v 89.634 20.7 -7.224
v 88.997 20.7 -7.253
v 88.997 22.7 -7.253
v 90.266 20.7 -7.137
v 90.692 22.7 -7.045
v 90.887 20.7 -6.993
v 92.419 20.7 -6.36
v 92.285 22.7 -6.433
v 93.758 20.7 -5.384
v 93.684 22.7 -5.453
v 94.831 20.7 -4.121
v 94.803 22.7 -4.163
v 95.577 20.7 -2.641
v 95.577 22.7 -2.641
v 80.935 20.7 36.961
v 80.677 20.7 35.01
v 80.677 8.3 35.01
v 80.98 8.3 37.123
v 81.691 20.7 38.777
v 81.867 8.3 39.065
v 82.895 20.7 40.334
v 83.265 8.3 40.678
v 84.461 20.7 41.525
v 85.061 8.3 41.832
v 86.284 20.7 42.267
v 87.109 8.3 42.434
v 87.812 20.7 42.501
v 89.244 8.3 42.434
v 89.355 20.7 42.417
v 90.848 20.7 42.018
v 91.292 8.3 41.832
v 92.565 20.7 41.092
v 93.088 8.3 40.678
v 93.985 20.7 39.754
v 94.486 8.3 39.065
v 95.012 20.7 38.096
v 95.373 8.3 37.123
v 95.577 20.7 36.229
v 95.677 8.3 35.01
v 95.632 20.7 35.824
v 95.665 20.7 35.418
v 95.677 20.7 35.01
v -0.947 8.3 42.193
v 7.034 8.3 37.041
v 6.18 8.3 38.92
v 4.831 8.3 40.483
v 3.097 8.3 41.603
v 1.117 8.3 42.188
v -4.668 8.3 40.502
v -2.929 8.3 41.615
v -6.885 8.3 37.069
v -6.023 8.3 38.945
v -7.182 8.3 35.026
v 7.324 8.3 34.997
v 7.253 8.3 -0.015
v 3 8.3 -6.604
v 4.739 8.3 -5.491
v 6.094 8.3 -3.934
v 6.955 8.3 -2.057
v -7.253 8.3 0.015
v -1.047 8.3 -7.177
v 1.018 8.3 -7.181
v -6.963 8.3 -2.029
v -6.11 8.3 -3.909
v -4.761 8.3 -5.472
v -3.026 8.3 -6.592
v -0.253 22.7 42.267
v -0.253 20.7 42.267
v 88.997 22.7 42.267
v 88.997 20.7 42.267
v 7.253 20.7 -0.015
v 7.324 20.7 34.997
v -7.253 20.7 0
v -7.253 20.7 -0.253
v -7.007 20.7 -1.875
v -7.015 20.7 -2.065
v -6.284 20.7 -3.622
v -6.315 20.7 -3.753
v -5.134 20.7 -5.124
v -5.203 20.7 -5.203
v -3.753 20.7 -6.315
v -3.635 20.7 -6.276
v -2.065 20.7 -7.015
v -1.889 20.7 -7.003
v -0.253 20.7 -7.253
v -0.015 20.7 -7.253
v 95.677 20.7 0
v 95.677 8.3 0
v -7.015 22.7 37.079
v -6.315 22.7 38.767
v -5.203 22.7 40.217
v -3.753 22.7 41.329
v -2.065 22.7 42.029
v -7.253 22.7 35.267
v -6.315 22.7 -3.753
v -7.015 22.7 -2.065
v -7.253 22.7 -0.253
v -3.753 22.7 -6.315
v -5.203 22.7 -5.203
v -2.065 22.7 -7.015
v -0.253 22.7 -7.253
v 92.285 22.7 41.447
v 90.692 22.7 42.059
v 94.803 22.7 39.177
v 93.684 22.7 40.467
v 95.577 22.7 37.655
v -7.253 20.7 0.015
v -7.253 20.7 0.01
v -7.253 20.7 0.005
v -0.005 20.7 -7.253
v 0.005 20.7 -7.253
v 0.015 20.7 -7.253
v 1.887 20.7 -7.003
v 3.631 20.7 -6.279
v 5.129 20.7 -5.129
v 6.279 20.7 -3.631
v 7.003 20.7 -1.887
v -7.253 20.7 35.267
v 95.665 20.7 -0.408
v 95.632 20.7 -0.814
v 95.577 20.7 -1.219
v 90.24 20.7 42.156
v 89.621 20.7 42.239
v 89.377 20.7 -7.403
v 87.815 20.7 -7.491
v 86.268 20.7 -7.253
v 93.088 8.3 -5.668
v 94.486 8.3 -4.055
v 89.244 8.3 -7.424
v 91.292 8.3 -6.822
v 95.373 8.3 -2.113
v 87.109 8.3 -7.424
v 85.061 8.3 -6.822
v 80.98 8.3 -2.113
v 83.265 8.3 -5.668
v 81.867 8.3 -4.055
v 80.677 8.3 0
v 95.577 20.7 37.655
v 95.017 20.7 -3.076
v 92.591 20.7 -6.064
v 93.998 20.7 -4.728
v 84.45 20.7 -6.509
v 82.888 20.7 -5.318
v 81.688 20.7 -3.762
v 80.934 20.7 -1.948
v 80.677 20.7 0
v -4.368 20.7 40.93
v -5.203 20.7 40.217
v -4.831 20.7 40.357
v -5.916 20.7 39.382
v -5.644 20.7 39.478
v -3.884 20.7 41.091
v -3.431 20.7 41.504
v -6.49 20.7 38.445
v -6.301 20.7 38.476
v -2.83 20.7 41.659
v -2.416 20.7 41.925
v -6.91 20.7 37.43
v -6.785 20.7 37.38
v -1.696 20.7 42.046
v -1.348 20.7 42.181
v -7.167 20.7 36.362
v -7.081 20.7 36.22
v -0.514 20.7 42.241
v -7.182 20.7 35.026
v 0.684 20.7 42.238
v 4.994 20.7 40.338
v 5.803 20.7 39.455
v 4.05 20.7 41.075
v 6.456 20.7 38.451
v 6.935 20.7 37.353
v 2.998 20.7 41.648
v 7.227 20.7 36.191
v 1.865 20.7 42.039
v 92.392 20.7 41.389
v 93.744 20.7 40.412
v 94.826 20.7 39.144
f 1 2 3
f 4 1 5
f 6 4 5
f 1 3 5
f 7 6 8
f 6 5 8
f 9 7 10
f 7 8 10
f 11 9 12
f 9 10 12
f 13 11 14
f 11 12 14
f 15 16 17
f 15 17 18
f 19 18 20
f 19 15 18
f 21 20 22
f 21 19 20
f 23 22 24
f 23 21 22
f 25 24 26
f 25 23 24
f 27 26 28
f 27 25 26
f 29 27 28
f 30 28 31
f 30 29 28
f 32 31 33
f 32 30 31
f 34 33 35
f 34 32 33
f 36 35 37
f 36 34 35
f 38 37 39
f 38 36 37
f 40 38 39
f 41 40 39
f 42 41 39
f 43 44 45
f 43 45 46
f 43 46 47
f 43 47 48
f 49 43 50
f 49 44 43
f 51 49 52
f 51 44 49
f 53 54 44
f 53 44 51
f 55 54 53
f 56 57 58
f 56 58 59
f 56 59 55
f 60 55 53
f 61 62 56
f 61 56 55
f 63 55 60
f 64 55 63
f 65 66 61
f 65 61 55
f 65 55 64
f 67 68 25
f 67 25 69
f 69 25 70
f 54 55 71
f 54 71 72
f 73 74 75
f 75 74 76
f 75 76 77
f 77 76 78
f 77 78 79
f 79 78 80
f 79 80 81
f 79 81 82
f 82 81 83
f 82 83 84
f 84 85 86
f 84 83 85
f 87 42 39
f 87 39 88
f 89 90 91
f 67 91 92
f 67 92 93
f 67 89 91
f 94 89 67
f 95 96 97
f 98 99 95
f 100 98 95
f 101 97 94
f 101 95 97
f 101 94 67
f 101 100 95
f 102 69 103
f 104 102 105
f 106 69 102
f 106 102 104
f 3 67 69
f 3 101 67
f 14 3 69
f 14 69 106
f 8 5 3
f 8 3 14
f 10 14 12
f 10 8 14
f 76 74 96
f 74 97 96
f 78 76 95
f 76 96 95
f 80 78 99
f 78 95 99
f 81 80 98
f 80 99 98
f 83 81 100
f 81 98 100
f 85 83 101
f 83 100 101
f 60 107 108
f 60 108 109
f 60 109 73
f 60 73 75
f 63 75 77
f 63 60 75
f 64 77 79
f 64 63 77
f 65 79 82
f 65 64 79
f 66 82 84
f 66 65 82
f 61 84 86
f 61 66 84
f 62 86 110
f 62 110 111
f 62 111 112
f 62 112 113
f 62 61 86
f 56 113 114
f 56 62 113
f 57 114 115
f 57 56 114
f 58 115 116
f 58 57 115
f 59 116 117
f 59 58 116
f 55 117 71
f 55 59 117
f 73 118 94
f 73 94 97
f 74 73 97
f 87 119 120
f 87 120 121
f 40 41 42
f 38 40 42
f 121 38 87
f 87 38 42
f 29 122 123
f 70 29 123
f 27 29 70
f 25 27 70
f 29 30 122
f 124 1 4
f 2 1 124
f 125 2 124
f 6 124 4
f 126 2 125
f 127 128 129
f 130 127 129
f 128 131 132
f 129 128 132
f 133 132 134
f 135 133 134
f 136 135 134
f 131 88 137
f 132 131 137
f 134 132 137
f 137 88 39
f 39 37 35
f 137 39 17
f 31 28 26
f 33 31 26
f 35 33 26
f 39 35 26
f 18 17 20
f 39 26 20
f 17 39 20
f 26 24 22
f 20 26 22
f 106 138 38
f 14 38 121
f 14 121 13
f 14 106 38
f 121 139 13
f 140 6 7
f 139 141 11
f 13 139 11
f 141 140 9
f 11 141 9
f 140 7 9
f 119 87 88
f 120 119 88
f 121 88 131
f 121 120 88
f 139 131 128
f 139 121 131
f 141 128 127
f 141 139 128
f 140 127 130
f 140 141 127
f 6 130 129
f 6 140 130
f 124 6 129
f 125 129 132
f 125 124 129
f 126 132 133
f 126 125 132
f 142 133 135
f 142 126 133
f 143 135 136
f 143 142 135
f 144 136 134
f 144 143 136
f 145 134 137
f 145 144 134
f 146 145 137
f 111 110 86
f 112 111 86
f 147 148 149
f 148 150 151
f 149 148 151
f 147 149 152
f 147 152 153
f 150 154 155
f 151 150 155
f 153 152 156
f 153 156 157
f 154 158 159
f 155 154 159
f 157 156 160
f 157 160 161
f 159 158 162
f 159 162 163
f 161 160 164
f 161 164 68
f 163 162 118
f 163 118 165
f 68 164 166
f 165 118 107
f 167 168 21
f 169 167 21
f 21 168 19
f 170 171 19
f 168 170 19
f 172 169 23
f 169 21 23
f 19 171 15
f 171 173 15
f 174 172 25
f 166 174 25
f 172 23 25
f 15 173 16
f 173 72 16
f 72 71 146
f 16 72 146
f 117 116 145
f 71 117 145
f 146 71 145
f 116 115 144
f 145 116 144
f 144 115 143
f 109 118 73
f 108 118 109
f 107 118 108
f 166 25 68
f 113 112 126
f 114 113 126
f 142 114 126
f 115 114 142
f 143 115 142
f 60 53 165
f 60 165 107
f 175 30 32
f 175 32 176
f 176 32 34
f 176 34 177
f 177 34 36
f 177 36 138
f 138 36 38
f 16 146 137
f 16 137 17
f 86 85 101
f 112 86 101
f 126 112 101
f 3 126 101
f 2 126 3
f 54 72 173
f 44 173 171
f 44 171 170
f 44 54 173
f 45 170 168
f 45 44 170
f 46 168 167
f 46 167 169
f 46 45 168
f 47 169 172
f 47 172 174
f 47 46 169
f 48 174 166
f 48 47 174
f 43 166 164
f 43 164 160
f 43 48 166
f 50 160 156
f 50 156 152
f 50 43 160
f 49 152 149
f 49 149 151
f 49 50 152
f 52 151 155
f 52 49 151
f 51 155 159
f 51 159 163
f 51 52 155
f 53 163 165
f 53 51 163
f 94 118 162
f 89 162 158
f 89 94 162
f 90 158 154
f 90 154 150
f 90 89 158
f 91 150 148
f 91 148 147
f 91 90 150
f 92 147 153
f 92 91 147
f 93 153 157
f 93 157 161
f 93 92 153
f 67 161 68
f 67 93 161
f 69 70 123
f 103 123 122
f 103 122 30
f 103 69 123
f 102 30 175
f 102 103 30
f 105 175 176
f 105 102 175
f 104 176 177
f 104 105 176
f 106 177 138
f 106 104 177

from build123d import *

# Parameters (mm, degrees)
BOSS_EXTRUDE1_DEPTH = 4.5
BOSS_EXTRUDE2_DEPTH = 3.8
BOSS_EXTRUDE3_DEPTH = 12.4
SKETCH5_W           = 103.25
SKETCH5_H           = 49.520314098
BOSS_EXTRUDE4_DEPTH = 2
FILLET1_R           = 7
SKETCH6_W           = 74.836382047
SKETCH6_H           = 26.769621583
CUT_EXTRUDE1_DEPTH  = 0.42
SKETCH7_W           = 32.821875261
SKETCH7_H           = 64.99782183
CUT_EXTRUDE4_DEPTH  = 8.3
BOSS_EXTRUDE5_DEPTH = 12.4


with BuildPart() as part:
    # Sketch1 → Boss-Extrude1 (new body)
    with BuildSketch(Plane(origin=(0, 0, 0), x_dir=(1, 0, 0), z_dir=(0, 1, 0))):
        with BuildLine():
            Line((7.25, 0), (7.25, -35))
            ThreePointArc((7.25, -35), (0, -42.25), (-7.25, -35))
            Line((-7.25, -35), (-7.25, 0))
            ThreePointArc((-7.25, 0), (0, 7.25), (7.25, 0))
        make_face()
    extrude(amount=BOSS_EXTRUDE1_DEPTH)

    # Sketch3 → Boss-Extrude2 (add)
    with BuildSketch(Plane(origin=(0, 4.5, 0), x_dir=(1, 0, 0), z_dir=(0, 1, 0))):
        with BuildLine():
            Line((-2.622571491, -0.457666807), (-2.622571491, -35.011296081))
            ThreePointArc((-2.622571491, -35.011296081), (0.070610389, -37.704477961), (2.763792269, -35.011296081))
            Line((2.763792269, -35.011296081), (2.763792269, -0.457666807))
            ThreePointArc((2.763792269, -0.457666807), (0.070610389, 2.718626164), (-2.622571491, -0.457666807))
        make_face()
    extrude(amount=BOSS_EXTRUDE2_DEPTH)

    # Sketch4 → Boss-Extrude3 (add)
    with BuildSketch(Plane(origin=(0, 8.3, 0), x_dir=(1, 0, 0), z_dir=(0, 1, 0))):
        with BuildLine():
            Line((7.25308141, 0.014627933), (7.323691799, -34.996668148))
            ThreePointArc((7.323691799, -34.996668148), (0.085238322, -42.264377491), (-7.182471021, -35.025924014))
            Line((-7.182471021, -35.025924014), (-7.25308141, -0.014627933))
            ThreePointArc((-7.25308141, -0.014627933), (-0.014627933, 7.25308141), (7.25308141, 0.014627933))
        make_face()
    extrude(amount=BOSS_EXTRUDE3_DEPTH)

    # Sketch5 → Boss-Extrude4 (add)
    with BuildSketch(Plane(origin=(0, 20.7, 0), x_dir=(1, 0, 0), z_dir=(0, 1, 0))):
        with Locations((44.371903839, -17.507075639)):
            Rectangle(SKETCH5_W, SKETCH5_H)
    extrude(amount=BOSS_EXTRUDE4_DEPTH)

    # Fillet1
    fillet1_edges = [part.edges().sort_by_distance(p)[0] for p in [
        (95.996903839, 21.7, 42.267232688),
        (95.996903839, 21.7, -7.25308141),
        (-7.253096161, 21.7, -7.25308141),
        (-7.253096161, 21.7, 42.267232688),
    ]]
    fillet(fillet1_edges, radius=FILLET1_R)

    # Sketch6 → Cut-Extrude1 (cut)
    with BuildSketch(Plane(origin=(95.996903839, 0, 0), x_dir=(0, 0, -1), z_dir=(1, 0, 0))):
        with Locations((-22.928368507, 17.221399119)):
            Rectangle(SKETCH6_W, SKETCH6_H)
    extrude(amount=-CUT_EXTRUDE1_DEPTH, mode=Mode.SUBTRACT)

    # Sketch7 → Cut-Extrude4 (cut)
    with BuildSketch(Plane.XZ):
        with Locations((-1.71559597, 16.327002209)):
            Rectangle(SKETCH7_W, SKETCH7_H)
    extrude(amount=-CUT_EXTRUDE4_DEPTH, mode=Mode.SUBTRACT)

    # Sketch9 → Boss-Extrude5 (add)
    with BuildSketch(Plane.XZ.offset(-20.7)):
        with BuildLine():
            Line((80.676554066, 0), (80.676554066, 35.01))
            ThreePointArc((80.676554066, 35.01), (88.176554066, 42.51), (95.676554066, 35.01))
            Line((95.676554066, 35.01), (95.676554066, 0))
            ThreePointArc((95.676554066, 0), (88.176554066, -7.5), (80.676554066, 0))
        make_face()
    extrude(amount=BOSS_EXTRUDE5_DEPTH)


solid = part.part
